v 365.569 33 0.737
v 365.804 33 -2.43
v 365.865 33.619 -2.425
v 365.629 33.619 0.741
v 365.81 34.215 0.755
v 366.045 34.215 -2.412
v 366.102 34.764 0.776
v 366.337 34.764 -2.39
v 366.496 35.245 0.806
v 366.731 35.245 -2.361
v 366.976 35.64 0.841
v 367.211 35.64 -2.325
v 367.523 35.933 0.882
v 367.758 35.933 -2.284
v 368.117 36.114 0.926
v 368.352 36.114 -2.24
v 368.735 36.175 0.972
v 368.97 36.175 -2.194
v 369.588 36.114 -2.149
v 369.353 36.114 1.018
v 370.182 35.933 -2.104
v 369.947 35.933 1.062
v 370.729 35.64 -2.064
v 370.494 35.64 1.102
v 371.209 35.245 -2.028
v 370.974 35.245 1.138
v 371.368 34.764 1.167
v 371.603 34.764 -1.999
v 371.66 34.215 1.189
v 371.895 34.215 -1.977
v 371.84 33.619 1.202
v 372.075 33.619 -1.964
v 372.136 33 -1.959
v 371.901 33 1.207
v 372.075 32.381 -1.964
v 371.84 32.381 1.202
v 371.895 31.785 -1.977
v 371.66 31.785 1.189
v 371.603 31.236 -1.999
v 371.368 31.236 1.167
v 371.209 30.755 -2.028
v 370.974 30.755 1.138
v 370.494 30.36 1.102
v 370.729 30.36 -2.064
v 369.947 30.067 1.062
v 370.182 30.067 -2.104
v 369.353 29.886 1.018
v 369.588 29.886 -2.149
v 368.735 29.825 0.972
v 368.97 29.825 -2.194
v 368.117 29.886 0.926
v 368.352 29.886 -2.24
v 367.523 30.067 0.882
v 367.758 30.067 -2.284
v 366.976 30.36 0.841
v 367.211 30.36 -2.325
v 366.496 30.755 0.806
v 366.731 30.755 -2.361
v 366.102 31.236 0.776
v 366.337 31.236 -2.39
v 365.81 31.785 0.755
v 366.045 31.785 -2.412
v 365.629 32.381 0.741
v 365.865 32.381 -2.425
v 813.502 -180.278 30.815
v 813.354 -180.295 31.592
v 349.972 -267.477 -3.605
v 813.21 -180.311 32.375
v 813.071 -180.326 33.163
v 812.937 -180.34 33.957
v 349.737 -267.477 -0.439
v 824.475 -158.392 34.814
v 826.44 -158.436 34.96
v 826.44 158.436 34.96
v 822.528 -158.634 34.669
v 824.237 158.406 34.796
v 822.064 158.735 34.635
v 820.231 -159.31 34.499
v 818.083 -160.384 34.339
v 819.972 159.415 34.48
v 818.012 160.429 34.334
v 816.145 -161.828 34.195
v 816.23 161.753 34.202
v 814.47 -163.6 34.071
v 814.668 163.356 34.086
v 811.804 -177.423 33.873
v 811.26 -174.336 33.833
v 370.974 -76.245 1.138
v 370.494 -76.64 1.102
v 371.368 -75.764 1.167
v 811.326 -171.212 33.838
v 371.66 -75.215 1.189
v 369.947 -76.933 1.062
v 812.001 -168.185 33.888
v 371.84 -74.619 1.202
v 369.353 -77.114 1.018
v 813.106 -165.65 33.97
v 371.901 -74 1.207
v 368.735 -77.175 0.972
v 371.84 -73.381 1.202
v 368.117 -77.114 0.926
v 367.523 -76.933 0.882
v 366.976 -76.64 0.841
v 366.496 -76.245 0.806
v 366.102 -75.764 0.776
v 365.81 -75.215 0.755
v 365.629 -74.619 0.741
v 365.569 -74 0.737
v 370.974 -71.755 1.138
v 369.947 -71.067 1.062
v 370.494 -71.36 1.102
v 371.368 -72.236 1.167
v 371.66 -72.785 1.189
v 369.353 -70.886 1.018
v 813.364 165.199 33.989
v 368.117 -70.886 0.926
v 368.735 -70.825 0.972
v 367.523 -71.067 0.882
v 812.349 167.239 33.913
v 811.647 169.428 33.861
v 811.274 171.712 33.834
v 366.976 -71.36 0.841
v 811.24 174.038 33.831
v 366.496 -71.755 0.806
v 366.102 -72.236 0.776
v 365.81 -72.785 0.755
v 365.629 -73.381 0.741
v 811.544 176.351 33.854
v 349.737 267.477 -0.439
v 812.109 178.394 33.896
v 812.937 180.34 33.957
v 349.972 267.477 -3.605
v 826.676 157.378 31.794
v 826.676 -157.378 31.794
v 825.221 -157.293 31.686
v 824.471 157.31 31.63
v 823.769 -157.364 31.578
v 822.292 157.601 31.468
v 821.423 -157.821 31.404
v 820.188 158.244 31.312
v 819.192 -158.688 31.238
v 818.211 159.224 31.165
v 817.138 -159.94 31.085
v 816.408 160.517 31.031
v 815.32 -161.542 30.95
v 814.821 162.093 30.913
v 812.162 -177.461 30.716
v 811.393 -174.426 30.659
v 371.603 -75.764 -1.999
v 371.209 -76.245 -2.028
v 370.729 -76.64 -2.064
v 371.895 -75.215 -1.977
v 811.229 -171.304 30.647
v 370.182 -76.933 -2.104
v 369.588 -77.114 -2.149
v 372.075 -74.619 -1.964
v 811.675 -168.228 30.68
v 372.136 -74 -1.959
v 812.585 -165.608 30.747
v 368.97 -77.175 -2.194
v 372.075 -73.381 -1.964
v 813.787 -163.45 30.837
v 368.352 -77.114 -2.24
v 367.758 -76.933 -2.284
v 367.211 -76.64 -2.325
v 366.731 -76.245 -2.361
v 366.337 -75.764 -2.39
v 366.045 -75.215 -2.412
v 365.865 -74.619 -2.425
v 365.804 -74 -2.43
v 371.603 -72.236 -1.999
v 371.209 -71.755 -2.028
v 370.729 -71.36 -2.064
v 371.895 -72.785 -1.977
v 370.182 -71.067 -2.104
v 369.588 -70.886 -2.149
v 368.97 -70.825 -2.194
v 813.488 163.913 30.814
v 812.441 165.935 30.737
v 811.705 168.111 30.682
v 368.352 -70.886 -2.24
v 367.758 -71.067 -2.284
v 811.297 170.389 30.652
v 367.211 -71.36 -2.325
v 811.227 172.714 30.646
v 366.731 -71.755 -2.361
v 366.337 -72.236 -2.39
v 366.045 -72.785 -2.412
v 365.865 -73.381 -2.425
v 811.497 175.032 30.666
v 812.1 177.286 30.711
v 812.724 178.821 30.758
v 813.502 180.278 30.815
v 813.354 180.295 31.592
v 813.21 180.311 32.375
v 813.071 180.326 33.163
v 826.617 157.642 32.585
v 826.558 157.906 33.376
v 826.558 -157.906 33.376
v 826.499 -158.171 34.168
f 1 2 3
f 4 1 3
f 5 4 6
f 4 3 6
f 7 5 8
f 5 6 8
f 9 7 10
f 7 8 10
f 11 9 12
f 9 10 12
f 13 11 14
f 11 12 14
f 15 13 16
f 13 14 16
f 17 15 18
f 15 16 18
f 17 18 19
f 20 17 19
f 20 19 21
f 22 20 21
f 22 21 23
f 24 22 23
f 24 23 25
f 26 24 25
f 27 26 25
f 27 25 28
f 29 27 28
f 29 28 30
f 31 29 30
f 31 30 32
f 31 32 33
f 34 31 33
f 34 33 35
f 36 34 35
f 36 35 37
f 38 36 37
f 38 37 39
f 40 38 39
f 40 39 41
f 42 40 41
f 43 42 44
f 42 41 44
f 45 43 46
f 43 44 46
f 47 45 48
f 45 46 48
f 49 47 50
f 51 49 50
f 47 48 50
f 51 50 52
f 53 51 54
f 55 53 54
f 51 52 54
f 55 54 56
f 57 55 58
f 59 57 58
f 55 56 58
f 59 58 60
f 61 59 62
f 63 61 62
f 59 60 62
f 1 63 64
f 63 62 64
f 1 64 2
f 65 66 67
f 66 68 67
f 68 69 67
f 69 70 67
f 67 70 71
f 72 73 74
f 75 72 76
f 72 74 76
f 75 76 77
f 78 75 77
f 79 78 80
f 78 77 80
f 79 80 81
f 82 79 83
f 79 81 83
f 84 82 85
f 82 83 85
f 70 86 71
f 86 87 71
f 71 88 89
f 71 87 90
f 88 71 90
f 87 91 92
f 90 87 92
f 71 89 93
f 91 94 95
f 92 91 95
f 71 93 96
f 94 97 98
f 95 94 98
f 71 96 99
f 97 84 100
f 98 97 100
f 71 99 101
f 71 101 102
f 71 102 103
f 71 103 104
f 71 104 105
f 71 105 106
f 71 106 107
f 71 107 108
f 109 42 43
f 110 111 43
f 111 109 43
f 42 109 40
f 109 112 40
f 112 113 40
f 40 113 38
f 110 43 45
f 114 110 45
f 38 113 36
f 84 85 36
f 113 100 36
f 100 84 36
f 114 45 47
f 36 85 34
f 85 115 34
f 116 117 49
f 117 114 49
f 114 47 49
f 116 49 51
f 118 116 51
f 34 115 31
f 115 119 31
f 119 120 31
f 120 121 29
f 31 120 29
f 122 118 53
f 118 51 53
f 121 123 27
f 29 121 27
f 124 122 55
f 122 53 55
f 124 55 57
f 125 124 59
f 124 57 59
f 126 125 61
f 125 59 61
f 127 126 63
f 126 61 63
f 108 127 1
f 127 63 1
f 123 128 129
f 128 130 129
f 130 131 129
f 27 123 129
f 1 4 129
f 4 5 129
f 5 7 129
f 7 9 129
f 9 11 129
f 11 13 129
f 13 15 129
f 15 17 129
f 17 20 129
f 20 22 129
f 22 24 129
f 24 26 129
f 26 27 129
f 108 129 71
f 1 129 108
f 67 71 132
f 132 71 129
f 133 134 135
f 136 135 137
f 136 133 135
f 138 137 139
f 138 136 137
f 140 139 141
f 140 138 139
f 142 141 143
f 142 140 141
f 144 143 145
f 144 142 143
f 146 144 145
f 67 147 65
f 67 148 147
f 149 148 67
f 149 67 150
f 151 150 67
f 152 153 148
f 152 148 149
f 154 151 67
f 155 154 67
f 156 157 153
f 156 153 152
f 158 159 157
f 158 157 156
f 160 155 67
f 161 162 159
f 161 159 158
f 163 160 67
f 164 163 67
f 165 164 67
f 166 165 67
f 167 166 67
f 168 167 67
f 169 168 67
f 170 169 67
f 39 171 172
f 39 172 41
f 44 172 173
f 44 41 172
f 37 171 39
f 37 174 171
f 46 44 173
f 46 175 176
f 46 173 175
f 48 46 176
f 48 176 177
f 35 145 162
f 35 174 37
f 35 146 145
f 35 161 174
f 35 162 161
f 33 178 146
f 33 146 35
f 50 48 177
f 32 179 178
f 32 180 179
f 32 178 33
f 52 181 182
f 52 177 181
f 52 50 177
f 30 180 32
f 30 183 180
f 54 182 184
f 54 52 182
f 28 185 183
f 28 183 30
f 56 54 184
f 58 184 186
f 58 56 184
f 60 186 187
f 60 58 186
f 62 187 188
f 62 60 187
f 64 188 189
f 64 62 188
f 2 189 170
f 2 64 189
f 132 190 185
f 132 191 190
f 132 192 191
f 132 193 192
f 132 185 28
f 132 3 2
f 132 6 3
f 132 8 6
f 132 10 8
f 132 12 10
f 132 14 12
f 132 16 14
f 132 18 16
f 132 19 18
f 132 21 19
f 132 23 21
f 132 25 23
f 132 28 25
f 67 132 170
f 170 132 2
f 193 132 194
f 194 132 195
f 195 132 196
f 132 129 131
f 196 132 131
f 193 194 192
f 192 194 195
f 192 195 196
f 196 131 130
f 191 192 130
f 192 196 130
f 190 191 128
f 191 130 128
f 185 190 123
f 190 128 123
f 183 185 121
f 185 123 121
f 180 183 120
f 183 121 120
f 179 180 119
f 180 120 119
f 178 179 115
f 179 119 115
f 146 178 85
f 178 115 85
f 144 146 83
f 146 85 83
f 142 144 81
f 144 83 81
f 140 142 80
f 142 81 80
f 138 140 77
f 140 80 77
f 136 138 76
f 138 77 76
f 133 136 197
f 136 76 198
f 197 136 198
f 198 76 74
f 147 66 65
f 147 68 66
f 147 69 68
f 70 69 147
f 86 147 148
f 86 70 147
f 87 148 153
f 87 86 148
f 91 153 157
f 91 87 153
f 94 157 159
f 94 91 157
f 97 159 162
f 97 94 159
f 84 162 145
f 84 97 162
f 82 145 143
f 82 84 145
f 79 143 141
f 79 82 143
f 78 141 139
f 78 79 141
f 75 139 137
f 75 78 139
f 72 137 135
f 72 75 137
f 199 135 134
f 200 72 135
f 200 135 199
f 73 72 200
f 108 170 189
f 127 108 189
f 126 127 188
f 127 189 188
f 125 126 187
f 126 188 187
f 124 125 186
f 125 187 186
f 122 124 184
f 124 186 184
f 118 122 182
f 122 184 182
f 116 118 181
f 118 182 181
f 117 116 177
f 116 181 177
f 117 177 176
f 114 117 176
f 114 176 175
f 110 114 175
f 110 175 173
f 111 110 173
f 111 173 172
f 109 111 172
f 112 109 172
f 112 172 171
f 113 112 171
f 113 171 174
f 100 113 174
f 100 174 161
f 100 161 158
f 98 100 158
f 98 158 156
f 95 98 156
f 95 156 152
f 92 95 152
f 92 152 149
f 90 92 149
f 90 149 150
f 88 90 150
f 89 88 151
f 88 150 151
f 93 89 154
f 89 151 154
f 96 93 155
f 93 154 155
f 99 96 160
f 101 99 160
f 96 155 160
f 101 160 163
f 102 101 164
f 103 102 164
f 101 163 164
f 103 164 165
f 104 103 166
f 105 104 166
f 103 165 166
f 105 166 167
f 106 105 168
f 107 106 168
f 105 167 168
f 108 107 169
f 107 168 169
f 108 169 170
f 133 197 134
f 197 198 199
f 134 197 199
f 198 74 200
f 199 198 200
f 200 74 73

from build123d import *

# Parameters (mm, degrees)
BOSS_EXTRUDE1_DEPTH = 3.175
SKETCH2_R           = 14.2875
CUT_EXTRUDE1_DEPTH  = 837.34562622
CUT_EXTRUDE2_DEPTH  = 880.199971547
SKETCH4_R           = 3.175
CUT_EXTRUDE3_DEPTH  = 870.180090301


with BuildPart() as part:
    # Sketch1 → Boss-Extrude1 (new body)
    with BuildSketch(Plane(origin=(1.950344864, 0, -26.264644174), x_dir=(-0.9972542674746705, 0, -0.07405353471346578), z_dir=(0.07405353471346578, 0, -0.9972542674746705))):
        Polygon((-183.644373355, -298.45), (-183.644373355, 298.45), (-826.760197391, 177.8), (-826.760197391, -177.8), align=None)
    extrude(amount=BOSS_EXTRUDE1_DEPTH)

    # Sketch2 → Cut-Extrude1 (cut, through all)
    with BuildSketch(Plane(origin=(825.5, 212.942802273, 150.983020837), x_dir=(1, 0, 0), z_dir=(0, 0.32191156150474026, 0.9467697431633416))):
        Circle(SKETCH2_R)
    cut_extrude1 = extrude(amount=-CUT_EXTRUDE1_DEPTH, mode=Mode.SUBTRACT)

    # Mirror1: Cut-Extrude1 across plane
    add(cut_extrude1.mirror(Plane.ZX), mode=Mode.SUBTRACT)

    # Sketch3 → Cut-Extrude2 (cut, through all)
    with BuildSketch(Plane(origin=(1.950344864, 0, -26.264644174), x_dir=(0.9972542674746705, 0, 0.0740535347134658), z_dir=(-0.0740535347134658, 0, 0.9972542674746706))):
        Polygon((348.744373355, -267.476862261), (348.744373355, 267.476862261), (183.644373355, 298.45), (183.644373355, -298.45), align=None)
    extrude(amount=-CUT_EXTRUDE2_DEPTH, mode=Mode.SUBTRACT)

    # Sketch4 → Cut-Extrude3 (cut, through all)
    with BuildSketch(Plane(origin=(2.185464837, 0, -29.430926473), x_dir=(-0.9972542674746705, 0, -0.0740535347134658), z_dir=(0.0740535347134658, 0, -0.9972542674746706))):
        with Locations((-367.794373355, 33)):
            Circle(SKETCH4_R)
        with Locations((-367.794373355, -74)):
            Circle(SKETCH4_R)
    extrude(amount=-CUT_EXTRUDE3_DEPTH, mode=Mode.SUBTRACT)


solid = part.part
